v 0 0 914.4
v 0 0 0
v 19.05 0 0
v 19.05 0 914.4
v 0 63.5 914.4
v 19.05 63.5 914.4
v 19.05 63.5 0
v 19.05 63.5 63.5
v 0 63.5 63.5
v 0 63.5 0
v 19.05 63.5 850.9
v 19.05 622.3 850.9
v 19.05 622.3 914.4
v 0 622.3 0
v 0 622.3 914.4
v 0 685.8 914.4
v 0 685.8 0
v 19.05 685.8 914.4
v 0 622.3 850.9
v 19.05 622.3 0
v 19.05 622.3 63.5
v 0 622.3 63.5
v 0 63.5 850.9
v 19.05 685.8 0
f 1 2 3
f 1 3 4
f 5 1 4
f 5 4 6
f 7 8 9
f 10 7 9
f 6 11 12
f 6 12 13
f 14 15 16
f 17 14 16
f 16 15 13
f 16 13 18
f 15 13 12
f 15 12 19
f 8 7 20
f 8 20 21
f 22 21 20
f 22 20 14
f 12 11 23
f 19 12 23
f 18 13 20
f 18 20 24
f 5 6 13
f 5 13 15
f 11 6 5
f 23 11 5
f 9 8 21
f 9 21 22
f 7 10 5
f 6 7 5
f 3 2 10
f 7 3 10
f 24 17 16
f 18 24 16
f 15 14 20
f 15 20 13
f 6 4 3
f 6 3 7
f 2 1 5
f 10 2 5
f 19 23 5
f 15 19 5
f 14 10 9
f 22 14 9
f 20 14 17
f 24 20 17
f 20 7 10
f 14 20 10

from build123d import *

# Parameters (mm, degrees)
F0_W     = 63.5
F0_H     = 914.4
F1_DEPTH = 19.05
F2_W     = 63.5
F2_H     = 914.4
F3_DEPTH = 19.05
F4_W     = 19.05
F4_H     = 63.5
F5_DEPTH = 558.8
F6_W     = 19.05
F6_H     = 63.5
F7_DEPTH = 558.8


with BuildPart() as f1:
    # F0 (on Right) → F1 (new body)
    with BuildSketch(Plane.YZ):
        with Locations((31.75, 457.2)):
            Rectangle(F0_W, F0_H)
    extrude(amount=F1_DEPTH)


with BuildPart() as f3:
    # F2 (on Right) → F3 (new body)
    with BuildSketch(Plane.YZ):
        with Locations((654.05, 457.2)):
            Rectangle(F2_W, F2_H)
    extrude(amount=F3_DEPTH)


with BuildPart() as f5:
    # F4 (on face) → F5 (new body, through all)
    with BuildSketch(Plane(origin=(0, 63.5, 0), x_dir=(-1, 0, 0), z_dir=(0, 1, 0))):
        with Locations((-9.525, 882.65)):
            Rectangle(F4_W, F4_H)
    extrude(amount=F5_DEPTH)


with BuildPart() as f7:
    # F6 (on face) → F7 (new body, through all)
    with BuildSketch(Plane(origin=(0, 63.5, 0), x_dir=(-1, 0, 0), z_dir=(0, 1, 0))):
        with Locations((-9.525, 31.75)):
            Rectangle(F6_W, F6_H)
    extrude(amount=F7_DEPTH)


solid = Compound([f1.part, f3.part, f5.part, f7.part])
